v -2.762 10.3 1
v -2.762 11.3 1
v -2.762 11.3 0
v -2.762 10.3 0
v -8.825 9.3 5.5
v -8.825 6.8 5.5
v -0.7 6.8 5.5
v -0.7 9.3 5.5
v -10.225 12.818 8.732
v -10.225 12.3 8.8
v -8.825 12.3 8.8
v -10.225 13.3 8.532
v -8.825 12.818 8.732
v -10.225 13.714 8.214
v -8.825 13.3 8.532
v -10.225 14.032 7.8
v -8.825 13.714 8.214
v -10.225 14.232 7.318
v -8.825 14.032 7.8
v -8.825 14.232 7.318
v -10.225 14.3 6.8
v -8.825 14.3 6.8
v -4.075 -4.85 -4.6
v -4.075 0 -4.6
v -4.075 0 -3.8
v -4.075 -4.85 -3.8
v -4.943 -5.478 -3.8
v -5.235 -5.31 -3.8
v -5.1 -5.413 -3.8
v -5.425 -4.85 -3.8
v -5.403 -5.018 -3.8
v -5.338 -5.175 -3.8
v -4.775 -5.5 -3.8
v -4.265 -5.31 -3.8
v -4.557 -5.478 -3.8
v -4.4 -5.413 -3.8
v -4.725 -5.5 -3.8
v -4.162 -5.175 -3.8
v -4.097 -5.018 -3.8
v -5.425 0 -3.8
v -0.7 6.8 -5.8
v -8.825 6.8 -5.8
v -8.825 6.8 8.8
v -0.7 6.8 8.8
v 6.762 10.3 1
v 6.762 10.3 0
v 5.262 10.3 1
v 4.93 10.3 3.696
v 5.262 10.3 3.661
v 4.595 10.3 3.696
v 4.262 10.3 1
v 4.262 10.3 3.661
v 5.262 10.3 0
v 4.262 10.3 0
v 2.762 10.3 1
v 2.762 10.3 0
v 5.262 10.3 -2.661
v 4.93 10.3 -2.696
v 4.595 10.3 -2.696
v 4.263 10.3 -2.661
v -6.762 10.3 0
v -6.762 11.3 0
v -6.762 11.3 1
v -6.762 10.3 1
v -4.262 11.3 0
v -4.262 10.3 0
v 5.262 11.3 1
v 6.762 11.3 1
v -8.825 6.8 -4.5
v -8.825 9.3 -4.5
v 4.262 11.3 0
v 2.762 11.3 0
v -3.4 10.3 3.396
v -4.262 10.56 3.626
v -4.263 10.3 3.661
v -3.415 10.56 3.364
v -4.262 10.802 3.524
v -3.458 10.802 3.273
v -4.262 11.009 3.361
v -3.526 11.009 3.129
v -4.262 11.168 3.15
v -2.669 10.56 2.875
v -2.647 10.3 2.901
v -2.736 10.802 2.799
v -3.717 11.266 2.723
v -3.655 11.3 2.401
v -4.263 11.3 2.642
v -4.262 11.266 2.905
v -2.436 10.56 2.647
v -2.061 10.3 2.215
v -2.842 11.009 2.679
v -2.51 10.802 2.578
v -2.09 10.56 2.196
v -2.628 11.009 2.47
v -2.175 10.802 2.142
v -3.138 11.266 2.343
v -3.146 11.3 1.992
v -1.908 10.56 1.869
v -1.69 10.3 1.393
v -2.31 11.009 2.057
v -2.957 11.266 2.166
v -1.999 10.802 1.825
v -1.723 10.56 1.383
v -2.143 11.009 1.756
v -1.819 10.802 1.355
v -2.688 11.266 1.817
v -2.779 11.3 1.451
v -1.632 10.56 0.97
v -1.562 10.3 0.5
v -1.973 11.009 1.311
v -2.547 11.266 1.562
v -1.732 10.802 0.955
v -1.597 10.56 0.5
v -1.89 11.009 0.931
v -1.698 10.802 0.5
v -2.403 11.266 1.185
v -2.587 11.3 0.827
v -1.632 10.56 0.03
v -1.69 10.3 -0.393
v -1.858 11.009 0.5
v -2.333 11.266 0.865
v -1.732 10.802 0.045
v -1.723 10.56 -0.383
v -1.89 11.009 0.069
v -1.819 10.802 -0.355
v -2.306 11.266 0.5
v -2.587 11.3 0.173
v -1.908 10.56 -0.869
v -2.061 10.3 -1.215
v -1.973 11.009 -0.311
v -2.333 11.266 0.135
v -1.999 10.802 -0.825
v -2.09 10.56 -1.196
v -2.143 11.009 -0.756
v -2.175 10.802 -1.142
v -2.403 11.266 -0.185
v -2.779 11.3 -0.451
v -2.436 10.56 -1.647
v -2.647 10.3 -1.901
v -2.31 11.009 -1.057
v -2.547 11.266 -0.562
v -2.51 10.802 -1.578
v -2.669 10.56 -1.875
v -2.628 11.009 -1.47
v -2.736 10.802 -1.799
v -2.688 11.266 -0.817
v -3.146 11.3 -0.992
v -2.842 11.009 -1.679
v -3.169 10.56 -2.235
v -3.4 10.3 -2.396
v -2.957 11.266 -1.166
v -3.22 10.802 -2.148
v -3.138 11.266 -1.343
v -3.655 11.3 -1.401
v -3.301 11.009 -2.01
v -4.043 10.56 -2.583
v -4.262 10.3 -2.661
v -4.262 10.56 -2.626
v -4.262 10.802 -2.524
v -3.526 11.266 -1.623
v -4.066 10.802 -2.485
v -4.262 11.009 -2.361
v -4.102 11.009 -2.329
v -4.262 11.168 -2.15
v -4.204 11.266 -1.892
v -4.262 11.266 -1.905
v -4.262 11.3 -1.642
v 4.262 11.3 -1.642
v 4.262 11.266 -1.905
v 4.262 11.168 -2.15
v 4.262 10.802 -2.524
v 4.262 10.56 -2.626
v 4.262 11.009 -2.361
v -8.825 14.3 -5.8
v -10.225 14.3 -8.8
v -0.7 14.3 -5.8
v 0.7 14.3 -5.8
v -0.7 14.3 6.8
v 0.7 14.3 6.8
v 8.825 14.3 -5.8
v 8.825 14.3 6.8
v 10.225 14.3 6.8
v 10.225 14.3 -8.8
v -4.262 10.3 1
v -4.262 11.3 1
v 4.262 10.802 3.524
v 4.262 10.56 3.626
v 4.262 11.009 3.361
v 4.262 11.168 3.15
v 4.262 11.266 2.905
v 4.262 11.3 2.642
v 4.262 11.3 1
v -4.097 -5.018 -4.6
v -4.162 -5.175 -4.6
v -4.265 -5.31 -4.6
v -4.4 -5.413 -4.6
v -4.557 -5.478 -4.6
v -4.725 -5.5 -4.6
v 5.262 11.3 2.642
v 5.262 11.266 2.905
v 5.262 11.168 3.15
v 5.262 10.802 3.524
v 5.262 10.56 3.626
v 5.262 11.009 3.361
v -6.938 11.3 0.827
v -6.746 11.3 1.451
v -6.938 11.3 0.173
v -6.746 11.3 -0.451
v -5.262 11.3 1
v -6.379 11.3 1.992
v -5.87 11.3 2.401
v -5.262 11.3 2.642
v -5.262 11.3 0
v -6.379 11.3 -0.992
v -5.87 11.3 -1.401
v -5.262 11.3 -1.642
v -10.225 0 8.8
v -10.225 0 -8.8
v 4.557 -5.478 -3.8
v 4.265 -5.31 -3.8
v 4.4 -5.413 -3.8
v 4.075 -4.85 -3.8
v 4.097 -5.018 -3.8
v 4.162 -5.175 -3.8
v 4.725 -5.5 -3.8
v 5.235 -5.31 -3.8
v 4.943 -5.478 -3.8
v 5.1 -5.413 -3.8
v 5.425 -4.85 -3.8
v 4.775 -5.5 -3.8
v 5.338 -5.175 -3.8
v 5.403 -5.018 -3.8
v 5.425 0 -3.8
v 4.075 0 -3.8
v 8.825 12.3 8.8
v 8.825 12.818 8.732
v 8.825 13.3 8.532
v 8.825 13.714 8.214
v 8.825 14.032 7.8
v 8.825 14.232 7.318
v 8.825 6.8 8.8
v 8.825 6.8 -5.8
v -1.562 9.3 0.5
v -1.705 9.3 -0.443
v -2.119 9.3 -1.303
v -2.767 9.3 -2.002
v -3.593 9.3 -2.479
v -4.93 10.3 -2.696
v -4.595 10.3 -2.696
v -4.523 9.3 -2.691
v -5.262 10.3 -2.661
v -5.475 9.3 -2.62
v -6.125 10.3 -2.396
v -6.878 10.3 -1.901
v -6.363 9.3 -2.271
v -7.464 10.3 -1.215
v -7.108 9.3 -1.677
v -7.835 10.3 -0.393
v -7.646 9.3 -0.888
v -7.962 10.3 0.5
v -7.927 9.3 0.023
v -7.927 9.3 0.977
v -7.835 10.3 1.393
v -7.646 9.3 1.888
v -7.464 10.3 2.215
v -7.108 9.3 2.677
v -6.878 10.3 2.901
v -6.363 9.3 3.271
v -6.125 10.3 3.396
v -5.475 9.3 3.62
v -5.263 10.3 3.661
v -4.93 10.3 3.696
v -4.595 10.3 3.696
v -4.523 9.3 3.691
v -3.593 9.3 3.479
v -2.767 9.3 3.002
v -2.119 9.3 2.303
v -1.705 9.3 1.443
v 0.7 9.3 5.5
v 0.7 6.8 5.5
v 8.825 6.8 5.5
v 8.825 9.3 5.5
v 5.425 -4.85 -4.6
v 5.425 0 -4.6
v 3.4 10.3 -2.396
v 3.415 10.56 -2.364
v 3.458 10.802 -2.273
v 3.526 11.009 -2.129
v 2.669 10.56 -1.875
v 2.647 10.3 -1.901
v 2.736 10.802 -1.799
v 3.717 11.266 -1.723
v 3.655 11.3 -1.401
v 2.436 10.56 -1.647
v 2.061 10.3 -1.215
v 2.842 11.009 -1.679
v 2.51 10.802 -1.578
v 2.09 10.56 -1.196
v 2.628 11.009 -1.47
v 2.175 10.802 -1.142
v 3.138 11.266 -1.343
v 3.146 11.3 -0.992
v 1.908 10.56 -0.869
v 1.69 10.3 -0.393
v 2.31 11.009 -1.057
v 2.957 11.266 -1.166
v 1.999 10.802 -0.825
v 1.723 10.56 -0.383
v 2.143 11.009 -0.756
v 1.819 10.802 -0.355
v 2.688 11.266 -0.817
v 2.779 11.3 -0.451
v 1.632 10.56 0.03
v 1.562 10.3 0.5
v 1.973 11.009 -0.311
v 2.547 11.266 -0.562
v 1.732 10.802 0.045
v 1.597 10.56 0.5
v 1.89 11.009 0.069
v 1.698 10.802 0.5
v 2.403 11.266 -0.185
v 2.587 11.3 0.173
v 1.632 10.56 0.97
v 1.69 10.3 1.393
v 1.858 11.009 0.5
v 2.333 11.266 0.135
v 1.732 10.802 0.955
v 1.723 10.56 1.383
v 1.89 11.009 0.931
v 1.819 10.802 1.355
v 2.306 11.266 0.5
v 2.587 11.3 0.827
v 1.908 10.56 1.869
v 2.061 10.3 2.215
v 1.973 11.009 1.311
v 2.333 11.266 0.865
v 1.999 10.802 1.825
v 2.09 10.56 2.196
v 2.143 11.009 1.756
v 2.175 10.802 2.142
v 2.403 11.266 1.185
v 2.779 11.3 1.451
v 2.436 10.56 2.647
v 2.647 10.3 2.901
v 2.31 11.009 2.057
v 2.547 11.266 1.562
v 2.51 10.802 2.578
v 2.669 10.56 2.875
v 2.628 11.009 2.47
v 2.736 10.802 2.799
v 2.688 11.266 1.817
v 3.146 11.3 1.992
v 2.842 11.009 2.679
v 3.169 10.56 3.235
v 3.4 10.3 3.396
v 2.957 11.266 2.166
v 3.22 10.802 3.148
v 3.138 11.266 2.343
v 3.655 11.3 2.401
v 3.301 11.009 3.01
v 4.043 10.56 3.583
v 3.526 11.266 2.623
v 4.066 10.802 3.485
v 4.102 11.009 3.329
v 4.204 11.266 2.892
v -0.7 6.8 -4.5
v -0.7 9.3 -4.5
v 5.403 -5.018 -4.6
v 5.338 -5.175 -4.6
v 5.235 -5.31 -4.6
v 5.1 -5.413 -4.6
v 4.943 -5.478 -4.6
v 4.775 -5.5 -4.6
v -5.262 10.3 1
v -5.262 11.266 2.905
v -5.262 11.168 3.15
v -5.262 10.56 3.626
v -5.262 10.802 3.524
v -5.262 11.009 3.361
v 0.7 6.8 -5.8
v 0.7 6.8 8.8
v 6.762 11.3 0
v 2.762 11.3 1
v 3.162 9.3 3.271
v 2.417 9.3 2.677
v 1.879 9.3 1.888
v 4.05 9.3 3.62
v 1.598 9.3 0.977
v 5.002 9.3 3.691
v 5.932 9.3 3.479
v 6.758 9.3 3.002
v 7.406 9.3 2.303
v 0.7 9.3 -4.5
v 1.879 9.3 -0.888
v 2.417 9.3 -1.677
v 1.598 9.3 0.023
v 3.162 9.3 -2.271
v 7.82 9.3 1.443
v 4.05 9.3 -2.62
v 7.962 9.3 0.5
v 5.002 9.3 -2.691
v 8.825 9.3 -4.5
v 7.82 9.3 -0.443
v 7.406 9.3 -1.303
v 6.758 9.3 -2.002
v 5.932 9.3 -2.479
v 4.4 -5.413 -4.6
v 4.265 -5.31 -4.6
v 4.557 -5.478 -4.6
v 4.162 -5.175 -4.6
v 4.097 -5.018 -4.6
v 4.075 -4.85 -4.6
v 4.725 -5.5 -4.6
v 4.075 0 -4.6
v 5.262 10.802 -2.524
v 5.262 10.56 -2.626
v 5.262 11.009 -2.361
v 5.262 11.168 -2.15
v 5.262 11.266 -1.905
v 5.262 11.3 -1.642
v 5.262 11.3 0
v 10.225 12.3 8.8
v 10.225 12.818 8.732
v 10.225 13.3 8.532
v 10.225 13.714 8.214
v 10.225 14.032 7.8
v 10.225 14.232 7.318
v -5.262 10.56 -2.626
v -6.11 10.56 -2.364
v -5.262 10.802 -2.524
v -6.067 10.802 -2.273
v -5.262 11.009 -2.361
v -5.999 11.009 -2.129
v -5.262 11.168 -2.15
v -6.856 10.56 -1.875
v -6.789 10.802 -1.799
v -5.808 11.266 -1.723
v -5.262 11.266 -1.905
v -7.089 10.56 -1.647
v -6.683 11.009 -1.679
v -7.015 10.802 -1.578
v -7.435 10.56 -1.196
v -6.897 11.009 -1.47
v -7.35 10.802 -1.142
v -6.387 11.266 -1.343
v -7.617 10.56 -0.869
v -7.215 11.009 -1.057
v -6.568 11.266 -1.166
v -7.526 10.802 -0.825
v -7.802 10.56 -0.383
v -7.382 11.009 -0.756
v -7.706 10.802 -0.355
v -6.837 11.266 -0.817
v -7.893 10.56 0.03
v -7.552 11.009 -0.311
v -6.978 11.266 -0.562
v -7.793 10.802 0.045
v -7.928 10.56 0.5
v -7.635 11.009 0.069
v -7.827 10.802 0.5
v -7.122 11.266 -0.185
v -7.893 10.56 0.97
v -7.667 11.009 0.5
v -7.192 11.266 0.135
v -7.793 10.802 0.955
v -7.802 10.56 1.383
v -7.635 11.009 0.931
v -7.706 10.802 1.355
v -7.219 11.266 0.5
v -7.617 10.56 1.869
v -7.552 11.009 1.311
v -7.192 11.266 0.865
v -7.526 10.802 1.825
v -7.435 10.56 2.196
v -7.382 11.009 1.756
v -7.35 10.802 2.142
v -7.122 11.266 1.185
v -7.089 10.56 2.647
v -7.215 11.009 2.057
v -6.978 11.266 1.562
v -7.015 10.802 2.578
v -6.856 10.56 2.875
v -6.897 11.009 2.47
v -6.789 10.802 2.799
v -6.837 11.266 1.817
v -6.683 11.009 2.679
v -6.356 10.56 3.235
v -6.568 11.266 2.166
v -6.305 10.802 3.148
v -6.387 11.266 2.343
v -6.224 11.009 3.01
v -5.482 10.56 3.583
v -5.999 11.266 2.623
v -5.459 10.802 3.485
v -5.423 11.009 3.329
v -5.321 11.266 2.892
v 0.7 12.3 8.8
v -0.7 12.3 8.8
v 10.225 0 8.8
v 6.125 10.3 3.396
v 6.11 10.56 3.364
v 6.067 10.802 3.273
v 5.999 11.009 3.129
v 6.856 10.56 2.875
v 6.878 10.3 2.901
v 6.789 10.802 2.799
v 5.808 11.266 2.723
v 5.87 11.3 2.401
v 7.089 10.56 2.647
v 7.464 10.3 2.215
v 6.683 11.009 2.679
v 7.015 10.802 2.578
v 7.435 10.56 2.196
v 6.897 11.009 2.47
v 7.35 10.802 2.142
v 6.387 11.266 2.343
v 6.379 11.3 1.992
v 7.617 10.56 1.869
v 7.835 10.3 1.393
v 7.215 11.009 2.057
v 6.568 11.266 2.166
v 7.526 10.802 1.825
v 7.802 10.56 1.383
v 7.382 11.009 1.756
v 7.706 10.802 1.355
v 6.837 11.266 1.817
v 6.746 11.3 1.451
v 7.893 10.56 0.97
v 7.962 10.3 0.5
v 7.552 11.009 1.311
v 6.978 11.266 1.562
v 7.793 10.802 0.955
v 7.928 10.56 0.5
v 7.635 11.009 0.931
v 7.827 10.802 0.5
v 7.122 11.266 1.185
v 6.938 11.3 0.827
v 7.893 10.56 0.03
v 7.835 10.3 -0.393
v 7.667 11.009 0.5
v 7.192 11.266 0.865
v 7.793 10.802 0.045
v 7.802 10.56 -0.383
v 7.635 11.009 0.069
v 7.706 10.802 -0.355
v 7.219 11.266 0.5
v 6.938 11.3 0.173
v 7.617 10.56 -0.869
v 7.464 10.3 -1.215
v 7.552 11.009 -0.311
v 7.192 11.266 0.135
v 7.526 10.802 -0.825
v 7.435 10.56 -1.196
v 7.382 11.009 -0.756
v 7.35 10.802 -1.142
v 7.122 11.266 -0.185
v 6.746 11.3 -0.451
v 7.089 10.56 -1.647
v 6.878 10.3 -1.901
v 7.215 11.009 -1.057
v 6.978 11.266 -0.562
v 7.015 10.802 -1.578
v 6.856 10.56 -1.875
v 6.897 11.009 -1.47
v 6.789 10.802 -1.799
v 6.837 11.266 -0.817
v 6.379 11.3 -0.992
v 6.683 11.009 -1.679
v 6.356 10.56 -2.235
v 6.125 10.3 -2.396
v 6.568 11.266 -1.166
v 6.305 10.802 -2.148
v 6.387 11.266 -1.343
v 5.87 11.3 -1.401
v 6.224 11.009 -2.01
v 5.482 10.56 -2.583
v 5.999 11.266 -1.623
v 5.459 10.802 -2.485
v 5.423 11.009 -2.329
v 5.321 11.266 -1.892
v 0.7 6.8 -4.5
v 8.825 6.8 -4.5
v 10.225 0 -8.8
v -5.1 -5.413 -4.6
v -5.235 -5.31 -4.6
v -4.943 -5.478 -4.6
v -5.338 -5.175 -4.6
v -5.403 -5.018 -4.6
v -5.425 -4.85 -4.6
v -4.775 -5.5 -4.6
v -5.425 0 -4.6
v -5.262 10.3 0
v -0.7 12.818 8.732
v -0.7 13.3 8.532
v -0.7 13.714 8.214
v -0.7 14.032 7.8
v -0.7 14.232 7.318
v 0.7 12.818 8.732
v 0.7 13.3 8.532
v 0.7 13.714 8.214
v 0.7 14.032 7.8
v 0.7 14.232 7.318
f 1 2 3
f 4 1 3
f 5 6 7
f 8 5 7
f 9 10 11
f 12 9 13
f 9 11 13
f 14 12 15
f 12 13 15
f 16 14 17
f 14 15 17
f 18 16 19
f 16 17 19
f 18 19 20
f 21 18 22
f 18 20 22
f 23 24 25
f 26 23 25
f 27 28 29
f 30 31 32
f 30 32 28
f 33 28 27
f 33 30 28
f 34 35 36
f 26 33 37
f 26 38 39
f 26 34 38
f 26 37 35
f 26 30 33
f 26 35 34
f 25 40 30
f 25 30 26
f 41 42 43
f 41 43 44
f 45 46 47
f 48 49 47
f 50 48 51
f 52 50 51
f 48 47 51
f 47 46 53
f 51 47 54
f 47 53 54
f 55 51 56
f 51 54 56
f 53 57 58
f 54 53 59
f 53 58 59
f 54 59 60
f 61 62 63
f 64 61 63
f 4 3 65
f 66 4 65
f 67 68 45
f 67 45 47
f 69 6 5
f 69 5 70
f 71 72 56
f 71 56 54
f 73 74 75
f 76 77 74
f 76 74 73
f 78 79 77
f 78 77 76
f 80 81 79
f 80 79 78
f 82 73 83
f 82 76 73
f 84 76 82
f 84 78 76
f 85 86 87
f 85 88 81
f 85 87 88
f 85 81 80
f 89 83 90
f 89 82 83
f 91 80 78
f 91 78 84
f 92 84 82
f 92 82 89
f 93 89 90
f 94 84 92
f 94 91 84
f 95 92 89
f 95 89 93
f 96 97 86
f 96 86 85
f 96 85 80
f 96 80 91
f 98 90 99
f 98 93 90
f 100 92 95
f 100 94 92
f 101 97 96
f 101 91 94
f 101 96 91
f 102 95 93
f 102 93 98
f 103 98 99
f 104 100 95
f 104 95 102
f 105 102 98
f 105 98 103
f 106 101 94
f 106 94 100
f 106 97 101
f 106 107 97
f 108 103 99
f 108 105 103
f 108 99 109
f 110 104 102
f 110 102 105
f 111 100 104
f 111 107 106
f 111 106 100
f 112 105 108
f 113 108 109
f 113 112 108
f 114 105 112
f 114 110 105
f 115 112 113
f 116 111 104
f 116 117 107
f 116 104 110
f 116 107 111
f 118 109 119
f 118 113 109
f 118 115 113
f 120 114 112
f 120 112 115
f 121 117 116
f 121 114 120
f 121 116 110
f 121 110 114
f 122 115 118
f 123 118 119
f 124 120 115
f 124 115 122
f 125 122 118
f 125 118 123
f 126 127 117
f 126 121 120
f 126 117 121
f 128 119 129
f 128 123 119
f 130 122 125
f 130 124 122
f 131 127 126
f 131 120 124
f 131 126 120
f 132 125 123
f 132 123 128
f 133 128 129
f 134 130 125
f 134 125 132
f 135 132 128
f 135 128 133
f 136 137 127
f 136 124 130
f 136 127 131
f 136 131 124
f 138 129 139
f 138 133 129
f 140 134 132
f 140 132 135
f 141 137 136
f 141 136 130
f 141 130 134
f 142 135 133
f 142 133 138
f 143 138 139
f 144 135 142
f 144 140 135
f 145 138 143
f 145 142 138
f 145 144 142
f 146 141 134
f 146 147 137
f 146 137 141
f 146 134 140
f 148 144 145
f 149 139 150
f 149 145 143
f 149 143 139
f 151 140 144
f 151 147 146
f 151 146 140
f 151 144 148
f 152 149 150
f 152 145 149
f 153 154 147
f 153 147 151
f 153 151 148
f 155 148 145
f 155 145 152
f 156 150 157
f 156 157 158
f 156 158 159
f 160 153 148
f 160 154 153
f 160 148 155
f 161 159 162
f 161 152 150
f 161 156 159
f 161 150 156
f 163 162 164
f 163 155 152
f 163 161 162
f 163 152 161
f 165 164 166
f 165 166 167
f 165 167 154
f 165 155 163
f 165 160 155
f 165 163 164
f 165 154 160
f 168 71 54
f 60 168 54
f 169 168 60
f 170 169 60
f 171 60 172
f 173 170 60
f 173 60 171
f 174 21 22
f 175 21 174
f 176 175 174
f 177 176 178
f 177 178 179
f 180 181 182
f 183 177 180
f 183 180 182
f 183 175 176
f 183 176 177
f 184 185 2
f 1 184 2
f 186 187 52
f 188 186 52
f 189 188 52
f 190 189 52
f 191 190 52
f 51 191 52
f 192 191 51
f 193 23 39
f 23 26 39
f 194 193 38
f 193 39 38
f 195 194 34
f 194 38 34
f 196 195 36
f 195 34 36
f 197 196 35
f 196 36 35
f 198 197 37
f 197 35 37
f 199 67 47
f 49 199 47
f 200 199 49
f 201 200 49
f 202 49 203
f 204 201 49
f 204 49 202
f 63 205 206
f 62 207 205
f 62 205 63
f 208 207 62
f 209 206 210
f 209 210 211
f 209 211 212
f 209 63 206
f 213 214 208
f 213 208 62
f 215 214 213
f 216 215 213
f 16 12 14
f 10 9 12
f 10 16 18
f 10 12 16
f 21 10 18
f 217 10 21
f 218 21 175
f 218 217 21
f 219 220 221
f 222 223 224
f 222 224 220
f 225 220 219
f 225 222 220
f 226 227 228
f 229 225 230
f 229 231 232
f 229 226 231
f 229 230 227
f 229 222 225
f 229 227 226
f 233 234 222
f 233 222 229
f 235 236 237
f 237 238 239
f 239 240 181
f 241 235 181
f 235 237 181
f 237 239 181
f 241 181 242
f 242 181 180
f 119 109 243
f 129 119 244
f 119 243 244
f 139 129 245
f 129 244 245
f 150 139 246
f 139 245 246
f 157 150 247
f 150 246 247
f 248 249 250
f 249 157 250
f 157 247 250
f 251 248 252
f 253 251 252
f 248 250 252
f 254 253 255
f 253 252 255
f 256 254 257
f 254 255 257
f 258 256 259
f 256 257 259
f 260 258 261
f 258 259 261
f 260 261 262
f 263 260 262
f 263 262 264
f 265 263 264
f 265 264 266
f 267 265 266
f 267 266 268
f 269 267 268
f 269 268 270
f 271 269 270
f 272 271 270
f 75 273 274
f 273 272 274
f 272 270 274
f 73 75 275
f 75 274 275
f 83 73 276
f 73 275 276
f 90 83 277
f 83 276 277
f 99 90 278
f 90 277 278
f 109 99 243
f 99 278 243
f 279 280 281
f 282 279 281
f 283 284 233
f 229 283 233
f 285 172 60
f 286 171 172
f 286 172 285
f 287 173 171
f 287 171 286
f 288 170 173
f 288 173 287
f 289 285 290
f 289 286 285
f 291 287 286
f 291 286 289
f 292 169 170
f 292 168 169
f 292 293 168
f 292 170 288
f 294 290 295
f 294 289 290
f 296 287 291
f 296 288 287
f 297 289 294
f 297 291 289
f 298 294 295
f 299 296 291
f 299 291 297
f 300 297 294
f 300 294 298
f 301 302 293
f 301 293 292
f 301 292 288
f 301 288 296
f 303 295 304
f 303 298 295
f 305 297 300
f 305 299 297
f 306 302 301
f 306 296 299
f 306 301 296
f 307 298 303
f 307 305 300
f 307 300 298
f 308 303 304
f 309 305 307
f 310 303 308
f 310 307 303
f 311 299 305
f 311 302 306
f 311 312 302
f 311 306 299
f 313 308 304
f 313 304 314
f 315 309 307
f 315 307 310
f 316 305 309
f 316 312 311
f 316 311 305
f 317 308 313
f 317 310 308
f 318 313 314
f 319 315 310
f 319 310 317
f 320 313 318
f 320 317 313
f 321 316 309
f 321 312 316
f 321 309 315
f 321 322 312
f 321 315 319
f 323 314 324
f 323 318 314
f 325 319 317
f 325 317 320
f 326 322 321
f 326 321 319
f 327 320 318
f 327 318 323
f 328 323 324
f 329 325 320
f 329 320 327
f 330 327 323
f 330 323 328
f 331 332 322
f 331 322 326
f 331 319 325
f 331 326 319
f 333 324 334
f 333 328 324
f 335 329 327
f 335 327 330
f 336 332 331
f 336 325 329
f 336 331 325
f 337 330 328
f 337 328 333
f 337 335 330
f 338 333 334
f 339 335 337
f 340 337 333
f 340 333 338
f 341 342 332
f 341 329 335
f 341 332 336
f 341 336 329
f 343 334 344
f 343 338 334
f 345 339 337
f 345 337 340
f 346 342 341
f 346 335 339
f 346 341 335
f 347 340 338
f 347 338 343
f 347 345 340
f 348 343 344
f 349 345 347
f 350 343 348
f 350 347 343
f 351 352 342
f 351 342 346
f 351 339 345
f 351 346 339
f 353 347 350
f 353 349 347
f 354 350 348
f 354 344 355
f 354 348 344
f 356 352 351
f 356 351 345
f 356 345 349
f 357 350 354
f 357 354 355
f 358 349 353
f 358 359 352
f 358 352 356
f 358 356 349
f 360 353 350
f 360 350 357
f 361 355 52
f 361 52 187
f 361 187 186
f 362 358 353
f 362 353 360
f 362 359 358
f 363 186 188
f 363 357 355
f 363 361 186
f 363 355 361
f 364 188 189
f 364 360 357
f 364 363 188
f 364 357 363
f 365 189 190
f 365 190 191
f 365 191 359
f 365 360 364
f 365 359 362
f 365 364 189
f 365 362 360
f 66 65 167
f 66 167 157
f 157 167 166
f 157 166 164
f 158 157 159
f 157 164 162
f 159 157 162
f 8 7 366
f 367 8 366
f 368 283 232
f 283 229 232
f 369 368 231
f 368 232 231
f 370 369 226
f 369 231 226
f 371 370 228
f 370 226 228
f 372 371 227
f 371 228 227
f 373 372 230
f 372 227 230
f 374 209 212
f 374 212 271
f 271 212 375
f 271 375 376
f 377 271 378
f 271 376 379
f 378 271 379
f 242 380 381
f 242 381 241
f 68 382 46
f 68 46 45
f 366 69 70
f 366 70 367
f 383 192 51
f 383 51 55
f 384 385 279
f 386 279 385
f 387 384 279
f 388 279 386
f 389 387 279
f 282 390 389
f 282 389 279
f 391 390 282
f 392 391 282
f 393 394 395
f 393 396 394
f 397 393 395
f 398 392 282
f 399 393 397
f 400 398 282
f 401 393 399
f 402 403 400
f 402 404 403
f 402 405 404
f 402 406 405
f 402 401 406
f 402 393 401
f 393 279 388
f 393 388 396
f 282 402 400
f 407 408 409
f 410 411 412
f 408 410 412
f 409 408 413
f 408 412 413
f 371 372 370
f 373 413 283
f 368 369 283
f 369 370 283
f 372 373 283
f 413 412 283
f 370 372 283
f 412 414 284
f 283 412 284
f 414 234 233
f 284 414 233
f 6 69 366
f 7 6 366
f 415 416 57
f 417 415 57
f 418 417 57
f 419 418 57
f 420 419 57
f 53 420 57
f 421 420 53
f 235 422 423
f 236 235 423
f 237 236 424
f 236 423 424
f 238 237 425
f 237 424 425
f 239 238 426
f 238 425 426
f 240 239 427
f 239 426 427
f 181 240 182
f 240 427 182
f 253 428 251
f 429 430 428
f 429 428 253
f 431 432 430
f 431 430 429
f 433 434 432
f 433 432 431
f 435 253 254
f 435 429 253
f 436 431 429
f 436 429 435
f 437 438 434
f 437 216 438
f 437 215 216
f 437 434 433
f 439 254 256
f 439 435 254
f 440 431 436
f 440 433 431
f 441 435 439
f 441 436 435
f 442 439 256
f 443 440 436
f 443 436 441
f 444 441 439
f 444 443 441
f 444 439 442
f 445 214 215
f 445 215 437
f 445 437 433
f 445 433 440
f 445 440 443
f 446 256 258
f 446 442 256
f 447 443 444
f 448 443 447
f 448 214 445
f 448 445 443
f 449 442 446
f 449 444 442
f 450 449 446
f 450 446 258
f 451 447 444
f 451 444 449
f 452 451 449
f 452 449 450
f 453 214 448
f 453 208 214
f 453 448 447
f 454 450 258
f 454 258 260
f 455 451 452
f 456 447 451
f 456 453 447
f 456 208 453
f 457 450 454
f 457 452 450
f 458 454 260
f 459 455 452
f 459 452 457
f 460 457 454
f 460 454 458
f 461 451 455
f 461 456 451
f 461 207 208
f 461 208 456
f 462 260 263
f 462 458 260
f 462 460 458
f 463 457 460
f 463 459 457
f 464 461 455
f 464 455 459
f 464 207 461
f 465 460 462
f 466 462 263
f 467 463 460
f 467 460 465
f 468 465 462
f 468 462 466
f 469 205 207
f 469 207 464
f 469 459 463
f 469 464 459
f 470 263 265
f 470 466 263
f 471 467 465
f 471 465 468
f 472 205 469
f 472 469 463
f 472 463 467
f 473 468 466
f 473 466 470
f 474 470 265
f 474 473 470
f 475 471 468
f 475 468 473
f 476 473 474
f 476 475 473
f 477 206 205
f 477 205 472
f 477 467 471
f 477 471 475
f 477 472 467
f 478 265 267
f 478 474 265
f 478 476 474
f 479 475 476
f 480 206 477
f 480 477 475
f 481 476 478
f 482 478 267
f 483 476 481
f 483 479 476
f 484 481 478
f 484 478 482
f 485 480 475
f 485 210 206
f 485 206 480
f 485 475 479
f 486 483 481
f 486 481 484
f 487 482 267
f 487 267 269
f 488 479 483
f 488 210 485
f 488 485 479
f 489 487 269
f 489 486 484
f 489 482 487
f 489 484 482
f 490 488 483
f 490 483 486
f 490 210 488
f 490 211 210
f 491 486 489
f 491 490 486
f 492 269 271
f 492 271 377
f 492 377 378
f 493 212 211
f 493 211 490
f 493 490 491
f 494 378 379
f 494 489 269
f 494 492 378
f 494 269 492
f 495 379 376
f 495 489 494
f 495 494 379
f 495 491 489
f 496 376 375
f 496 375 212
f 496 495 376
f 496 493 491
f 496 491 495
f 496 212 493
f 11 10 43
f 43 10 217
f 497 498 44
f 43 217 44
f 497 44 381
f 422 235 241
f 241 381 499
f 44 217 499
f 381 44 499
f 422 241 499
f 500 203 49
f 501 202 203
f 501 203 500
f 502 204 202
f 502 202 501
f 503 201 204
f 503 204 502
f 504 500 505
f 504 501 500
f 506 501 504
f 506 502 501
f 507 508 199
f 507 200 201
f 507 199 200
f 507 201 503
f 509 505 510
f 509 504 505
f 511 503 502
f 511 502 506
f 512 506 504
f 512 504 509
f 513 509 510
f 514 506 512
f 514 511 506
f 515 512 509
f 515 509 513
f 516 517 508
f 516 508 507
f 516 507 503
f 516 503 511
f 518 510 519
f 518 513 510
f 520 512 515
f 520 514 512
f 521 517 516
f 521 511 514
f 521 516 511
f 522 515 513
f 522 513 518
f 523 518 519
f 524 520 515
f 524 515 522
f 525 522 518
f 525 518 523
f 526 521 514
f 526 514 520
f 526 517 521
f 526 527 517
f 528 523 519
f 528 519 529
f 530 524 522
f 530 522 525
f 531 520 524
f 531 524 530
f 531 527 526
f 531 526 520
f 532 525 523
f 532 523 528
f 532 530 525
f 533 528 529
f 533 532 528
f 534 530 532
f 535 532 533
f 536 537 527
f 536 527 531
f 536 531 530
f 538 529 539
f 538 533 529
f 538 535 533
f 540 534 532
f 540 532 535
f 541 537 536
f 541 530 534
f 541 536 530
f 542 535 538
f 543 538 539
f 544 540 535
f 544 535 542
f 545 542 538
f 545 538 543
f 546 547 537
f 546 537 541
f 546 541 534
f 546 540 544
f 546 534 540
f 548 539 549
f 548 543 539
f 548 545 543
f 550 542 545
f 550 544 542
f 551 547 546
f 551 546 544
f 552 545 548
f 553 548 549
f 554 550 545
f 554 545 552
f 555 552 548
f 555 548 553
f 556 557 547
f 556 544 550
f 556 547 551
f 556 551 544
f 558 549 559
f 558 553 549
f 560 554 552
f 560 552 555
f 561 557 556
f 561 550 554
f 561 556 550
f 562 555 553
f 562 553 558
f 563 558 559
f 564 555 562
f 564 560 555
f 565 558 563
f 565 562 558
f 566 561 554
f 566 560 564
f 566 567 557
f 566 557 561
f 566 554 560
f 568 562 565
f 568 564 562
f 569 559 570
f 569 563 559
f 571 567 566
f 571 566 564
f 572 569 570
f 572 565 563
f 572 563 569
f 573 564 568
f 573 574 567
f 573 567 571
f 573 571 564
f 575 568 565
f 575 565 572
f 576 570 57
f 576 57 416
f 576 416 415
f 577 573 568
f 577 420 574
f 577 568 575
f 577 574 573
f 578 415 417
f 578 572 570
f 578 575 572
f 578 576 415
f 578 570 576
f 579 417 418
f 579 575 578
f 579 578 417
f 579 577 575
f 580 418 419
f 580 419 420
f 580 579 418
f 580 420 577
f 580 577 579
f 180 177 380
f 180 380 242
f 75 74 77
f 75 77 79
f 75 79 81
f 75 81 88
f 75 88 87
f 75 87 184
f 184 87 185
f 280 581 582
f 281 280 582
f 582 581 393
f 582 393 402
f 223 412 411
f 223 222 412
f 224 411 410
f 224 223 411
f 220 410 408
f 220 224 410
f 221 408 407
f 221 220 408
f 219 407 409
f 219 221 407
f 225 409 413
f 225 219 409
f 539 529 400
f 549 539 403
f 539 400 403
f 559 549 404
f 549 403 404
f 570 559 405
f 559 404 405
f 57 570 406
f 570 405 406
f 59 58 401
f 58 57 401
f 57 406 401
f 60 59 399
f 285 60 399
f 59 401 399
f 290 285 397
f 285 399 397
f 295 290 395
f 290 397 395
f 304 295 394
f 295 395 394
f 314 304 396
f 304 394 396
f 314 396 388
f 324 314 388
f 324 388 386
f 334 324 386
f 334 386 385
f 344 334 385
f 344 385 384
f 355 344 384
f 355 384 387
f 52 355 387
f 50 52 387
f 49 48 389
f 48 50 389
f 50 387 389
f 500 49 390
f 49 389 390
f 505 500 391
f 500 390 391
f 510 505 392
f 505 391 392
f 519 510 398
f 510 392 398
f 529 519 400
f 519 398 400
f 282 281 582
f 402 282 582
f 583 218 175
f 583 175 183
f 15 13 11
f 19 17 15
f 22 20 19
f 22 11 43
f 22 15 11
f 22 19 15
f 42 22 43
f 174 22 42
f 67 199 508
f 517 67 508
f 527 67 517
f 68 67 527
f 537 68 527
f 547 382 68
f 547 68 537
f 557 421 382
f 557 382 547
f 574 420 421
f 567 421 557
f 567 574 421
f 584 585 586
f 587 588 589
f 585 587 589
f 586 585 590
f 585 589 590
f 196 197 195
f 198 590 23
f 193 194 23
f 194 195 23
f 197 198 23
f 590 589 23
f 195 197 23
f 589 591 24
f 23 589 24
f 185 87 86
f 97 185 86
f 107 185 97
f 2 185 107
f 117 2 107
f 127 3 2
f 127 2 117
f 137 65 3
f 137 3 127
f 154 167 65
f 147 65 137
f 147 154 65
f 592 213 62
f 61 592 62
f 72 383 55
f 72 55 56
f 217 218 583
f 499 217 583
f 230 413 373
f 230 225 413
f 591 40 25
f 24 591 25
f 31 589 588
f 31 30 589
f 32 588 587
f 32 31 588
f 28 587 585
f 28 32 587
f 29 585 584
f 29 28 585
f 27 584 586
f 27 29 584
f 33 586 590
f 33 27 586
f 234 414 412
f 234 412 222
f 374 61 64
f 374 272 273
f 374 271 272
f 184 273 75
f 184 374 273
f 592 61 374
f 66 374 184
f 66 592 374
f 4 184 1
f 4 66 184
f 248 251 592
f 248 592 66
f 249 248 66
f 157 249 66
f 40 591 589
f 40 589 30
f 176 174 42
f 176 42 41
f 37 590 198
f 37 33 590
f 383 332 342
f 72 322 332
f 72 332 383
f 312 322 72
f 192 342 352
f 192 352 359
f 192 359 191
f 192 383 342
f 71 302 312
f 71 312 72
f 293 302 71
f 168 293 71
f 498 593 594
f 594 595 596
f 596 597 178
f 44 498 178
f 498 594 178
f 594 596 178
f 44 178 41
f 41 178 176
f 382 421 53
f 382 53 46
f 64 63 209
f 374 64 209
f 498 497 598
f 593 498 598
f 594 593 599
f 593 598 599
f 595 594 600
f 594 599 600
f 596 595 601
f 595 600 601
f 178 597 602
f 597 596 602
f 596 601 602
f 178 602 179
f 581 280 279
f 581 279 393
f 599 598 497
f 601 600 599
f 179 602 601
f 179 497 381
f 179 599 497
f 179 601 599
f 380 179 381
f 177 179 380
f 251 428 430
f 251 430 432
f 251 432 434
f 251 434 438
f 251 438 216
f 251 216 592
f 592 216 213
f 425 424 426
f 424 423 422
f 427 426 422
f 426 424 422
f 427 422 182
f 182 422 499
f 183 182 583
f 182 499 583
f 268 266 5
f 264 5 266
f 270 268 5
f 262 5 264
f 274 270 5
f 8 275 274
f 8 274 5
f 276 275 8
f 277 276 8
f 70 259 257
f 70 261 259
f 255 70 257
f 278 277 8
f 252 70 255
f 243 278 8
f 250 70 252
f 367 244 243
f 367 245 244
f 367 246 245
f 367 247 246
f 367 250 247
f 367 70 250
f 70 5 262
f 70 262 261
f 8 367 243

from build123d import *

# Parameters (mm, degrees)
SKETCH1_W             = 20.45
SKETCH1_H             = 17.6
BOSS_EXTRUDE1_DEPTH   = 14.3
FILLET1_R             = 2
SKETCH2_W             = 8.125
SKETCH2_H             = 14.6
CUT_EXTRUDE1_DEPTH    = 7.5
SKETCH3_W             = 1.35
SKETCH3_H             = 0.8
BOSS_EXTRUDE2_DEPTH   = 5.5
BOSS_EXTRUDE2_2_DEPTH = 5.5
FILLET3_R             = 0.65
FILLET4_R             = 0.65
SKETCH4_W             = 8.125
SKETCH4_H             = 10
BOSS_EXTRUDE3_DEPTH   = 2.5
BOSS_EXTRUDE3_2_DEPTH = 2.5
SKETCH5_R             = 3.2
BOSS_EXTRUDE4_DEPTH   = 2
CUT_EXTRUDE2_DEPTH    = 1
FILLET5_R             = 1
FILLET6_R             = 1


with BuildPart() as part:
    # Sketch1 → Boss-Extrude1 (new body)
    with BuildSketch(Plane(origin=(0, 0, 0), x_dir=(1, 0, 0), z_dir=(0, 1, 0))):
        Rectangle(SKETCH1_W, SKETCH1_H)
    extrude(amount=BOSS_EXTRUDE1_DEPTH)

    # Fillet1
    fillet1_edges = [part.edges().sort_by_distance(p)[0] for p in [
        (0, 14.3, 8.8),
    ]]
    fillet(fillet1_edges, radius=FILLET1_R)

    # Sketch2 → Cut-Extrude1 (cut)
    with BuildSketch(Plane(origin=(0, 14.3, 0), x_dir=(1, 0, 0), z_dir=(0, 1, 0))):
        with Locations((-4.7625, -1.5)):
            Rectangle(SKETCH2_W, SKETCH2_H)
        with Locations((4.7625, -1.5)):
            Rectangle(SKETCH2_W, SKETCH2_H)
    extrude(amount=-CUT_EXTRUDE1_DEPTH, mode=Mode.SUBTRACT)


with BuildPart() as body_2:
    # Sketch3 → Boss-Extrude2 (new body)
    with BuildSketch(Plane.XZ):
        with Locations((-4.75, -4.2)):
            Rectangle(SKETCH3_W, SKETCH3_H)
    extrude(amount=BOSS_EXTRUDE2_DEPTH)

    # Fillet4
    fillet4_edges = [body_2.edges().sort_by_distance(p)[0] for p in [
        (-4.075, -5.5, -4.2),
        (-5.425, -5.5, -4.2),
    ]]
    fillet(fillet4_edges, radius=FILLET4_R)


with BuildPart() as body_3:
    # Sketch3 → Boss-Extrude2 2 (new body)
    with BuildSketch(Plane.XZ):
        with Locations((4.75, -4.2)):
            Rectangle(SKETCH3_W, SKETCH3_H)
    extrude(amount=BOSS_EXTRUDE2_2_DEPTH)

    # Fillet3
    fillet3_edges = [body_3.edges().sort_by_distance(p)[0] for p in [
        (5.425, -5.5, -4.2),
        (4.075, -5.5, -4.2),
    ]]
    fillet(fillet3_edges, radius=FILLET3_R)


with BuildPart() as body_4:
    # Sketch4 → Boss-Extrude3 (new body)
    with BuildSketch(Plane(origin=(0, 6.8, 0), x_dir=(1, 0, 0), z_dir=(0, 1, 0))):
        with Locations((-4.7625, -0.5)):
            Rectangle(SKETCH4_W, SKETCH4_H)
    extrude(amount=BOSS_EXTRUDE3_DEPTH)



with BuildPart() as body_5:
    # Sketch4 → Boss-Extrude3 2 (new body)
    with BuildSketch(Plane(origin=(0, 6.8, 0), x_dir=(1, 0, 0), z_dir=(0, 1, 0))):
        with Locations((4.7625, -0.5)):
            Rectangle(SKETCH4_W, SKETCH4_H)
    extrude(amount=BOSS_EXTRUDE3_2_DEPTH)


with BuildPart() as body_4_1:
    add(body_4.part)

    add(body_5.part)  # Boss-Extrude4 merges body 5
    # Sketch5 → Boss-Extrude4 (add)
    with BuildSketch(Plane(origin=(0, 9.3, 0), x_dir=(1, 0, 0), z_dir=(0, 1, 0))):
        with Locations((-4.7625, -0.5)):
            Circle(SKETCH5_R)
        with Locations((4.7625, -0.5)):
            Circle(SKETCH5_R)
    extrude(amount=BOSS_EXTRUDE4_DEPTH)

    # Sketch6 → Cut-Extrude2 (cut)
    with BuildSketch(Plane(origin=(0, 11.3, 0), x_dir=(1, 0, 0), z_dir=(0, 1, 0))):
        Polygon((-5.2625, 2.7), (-5.2625, 0), (-6.7625, 0), (-6.7625, -1), (-5.2625, -1), (-5.2625, -3.7), (-4.2625, -3.7), (-4.2625, -1), (-2.7625, -1), (-2.7625, 0), (-4.2625, 0), (-4.2625, 2.7), align=None)
        Polygon((4.2625, 0), (4.2625, 2.7), (5.2625, 2.7), (5.2625, 0), (6.7625, 0), (6.7625, -1), (5.2625, -1), (5.2625, -3.7), (4.2625, -3.7), (4.2625, -1), (2.7625, -1), (2.7625, 0), align=None)
    extrude(amount=-CUT_EXTRUDE2_DEPTH, mode=Mode.SUBTRACT)

    # Fillet5
    fillet5_edges = [body_4_1.edges().sort_by_distance(p)[0] for p in [
        (-2.329394988, 11.3, -1.578460969),
        (-7.9625, 11.3, 0.5),
    ]]
    fillet(fillet5_edges, radius=FILLET5_R)

    # Fillet6
    fillet6_edges = [body_4_1.edges().sort_by_distance(p)[0] for p in [
        (7.195605012, 11.3, -1.578460969),
        (1.5625, 11.3, 0.5),
    ]]
    fillet(fillet6_edges, radius=FILLET6_R)


solid = Compound([part.part, body_2.part, body_3.part, body_4_1.part])
